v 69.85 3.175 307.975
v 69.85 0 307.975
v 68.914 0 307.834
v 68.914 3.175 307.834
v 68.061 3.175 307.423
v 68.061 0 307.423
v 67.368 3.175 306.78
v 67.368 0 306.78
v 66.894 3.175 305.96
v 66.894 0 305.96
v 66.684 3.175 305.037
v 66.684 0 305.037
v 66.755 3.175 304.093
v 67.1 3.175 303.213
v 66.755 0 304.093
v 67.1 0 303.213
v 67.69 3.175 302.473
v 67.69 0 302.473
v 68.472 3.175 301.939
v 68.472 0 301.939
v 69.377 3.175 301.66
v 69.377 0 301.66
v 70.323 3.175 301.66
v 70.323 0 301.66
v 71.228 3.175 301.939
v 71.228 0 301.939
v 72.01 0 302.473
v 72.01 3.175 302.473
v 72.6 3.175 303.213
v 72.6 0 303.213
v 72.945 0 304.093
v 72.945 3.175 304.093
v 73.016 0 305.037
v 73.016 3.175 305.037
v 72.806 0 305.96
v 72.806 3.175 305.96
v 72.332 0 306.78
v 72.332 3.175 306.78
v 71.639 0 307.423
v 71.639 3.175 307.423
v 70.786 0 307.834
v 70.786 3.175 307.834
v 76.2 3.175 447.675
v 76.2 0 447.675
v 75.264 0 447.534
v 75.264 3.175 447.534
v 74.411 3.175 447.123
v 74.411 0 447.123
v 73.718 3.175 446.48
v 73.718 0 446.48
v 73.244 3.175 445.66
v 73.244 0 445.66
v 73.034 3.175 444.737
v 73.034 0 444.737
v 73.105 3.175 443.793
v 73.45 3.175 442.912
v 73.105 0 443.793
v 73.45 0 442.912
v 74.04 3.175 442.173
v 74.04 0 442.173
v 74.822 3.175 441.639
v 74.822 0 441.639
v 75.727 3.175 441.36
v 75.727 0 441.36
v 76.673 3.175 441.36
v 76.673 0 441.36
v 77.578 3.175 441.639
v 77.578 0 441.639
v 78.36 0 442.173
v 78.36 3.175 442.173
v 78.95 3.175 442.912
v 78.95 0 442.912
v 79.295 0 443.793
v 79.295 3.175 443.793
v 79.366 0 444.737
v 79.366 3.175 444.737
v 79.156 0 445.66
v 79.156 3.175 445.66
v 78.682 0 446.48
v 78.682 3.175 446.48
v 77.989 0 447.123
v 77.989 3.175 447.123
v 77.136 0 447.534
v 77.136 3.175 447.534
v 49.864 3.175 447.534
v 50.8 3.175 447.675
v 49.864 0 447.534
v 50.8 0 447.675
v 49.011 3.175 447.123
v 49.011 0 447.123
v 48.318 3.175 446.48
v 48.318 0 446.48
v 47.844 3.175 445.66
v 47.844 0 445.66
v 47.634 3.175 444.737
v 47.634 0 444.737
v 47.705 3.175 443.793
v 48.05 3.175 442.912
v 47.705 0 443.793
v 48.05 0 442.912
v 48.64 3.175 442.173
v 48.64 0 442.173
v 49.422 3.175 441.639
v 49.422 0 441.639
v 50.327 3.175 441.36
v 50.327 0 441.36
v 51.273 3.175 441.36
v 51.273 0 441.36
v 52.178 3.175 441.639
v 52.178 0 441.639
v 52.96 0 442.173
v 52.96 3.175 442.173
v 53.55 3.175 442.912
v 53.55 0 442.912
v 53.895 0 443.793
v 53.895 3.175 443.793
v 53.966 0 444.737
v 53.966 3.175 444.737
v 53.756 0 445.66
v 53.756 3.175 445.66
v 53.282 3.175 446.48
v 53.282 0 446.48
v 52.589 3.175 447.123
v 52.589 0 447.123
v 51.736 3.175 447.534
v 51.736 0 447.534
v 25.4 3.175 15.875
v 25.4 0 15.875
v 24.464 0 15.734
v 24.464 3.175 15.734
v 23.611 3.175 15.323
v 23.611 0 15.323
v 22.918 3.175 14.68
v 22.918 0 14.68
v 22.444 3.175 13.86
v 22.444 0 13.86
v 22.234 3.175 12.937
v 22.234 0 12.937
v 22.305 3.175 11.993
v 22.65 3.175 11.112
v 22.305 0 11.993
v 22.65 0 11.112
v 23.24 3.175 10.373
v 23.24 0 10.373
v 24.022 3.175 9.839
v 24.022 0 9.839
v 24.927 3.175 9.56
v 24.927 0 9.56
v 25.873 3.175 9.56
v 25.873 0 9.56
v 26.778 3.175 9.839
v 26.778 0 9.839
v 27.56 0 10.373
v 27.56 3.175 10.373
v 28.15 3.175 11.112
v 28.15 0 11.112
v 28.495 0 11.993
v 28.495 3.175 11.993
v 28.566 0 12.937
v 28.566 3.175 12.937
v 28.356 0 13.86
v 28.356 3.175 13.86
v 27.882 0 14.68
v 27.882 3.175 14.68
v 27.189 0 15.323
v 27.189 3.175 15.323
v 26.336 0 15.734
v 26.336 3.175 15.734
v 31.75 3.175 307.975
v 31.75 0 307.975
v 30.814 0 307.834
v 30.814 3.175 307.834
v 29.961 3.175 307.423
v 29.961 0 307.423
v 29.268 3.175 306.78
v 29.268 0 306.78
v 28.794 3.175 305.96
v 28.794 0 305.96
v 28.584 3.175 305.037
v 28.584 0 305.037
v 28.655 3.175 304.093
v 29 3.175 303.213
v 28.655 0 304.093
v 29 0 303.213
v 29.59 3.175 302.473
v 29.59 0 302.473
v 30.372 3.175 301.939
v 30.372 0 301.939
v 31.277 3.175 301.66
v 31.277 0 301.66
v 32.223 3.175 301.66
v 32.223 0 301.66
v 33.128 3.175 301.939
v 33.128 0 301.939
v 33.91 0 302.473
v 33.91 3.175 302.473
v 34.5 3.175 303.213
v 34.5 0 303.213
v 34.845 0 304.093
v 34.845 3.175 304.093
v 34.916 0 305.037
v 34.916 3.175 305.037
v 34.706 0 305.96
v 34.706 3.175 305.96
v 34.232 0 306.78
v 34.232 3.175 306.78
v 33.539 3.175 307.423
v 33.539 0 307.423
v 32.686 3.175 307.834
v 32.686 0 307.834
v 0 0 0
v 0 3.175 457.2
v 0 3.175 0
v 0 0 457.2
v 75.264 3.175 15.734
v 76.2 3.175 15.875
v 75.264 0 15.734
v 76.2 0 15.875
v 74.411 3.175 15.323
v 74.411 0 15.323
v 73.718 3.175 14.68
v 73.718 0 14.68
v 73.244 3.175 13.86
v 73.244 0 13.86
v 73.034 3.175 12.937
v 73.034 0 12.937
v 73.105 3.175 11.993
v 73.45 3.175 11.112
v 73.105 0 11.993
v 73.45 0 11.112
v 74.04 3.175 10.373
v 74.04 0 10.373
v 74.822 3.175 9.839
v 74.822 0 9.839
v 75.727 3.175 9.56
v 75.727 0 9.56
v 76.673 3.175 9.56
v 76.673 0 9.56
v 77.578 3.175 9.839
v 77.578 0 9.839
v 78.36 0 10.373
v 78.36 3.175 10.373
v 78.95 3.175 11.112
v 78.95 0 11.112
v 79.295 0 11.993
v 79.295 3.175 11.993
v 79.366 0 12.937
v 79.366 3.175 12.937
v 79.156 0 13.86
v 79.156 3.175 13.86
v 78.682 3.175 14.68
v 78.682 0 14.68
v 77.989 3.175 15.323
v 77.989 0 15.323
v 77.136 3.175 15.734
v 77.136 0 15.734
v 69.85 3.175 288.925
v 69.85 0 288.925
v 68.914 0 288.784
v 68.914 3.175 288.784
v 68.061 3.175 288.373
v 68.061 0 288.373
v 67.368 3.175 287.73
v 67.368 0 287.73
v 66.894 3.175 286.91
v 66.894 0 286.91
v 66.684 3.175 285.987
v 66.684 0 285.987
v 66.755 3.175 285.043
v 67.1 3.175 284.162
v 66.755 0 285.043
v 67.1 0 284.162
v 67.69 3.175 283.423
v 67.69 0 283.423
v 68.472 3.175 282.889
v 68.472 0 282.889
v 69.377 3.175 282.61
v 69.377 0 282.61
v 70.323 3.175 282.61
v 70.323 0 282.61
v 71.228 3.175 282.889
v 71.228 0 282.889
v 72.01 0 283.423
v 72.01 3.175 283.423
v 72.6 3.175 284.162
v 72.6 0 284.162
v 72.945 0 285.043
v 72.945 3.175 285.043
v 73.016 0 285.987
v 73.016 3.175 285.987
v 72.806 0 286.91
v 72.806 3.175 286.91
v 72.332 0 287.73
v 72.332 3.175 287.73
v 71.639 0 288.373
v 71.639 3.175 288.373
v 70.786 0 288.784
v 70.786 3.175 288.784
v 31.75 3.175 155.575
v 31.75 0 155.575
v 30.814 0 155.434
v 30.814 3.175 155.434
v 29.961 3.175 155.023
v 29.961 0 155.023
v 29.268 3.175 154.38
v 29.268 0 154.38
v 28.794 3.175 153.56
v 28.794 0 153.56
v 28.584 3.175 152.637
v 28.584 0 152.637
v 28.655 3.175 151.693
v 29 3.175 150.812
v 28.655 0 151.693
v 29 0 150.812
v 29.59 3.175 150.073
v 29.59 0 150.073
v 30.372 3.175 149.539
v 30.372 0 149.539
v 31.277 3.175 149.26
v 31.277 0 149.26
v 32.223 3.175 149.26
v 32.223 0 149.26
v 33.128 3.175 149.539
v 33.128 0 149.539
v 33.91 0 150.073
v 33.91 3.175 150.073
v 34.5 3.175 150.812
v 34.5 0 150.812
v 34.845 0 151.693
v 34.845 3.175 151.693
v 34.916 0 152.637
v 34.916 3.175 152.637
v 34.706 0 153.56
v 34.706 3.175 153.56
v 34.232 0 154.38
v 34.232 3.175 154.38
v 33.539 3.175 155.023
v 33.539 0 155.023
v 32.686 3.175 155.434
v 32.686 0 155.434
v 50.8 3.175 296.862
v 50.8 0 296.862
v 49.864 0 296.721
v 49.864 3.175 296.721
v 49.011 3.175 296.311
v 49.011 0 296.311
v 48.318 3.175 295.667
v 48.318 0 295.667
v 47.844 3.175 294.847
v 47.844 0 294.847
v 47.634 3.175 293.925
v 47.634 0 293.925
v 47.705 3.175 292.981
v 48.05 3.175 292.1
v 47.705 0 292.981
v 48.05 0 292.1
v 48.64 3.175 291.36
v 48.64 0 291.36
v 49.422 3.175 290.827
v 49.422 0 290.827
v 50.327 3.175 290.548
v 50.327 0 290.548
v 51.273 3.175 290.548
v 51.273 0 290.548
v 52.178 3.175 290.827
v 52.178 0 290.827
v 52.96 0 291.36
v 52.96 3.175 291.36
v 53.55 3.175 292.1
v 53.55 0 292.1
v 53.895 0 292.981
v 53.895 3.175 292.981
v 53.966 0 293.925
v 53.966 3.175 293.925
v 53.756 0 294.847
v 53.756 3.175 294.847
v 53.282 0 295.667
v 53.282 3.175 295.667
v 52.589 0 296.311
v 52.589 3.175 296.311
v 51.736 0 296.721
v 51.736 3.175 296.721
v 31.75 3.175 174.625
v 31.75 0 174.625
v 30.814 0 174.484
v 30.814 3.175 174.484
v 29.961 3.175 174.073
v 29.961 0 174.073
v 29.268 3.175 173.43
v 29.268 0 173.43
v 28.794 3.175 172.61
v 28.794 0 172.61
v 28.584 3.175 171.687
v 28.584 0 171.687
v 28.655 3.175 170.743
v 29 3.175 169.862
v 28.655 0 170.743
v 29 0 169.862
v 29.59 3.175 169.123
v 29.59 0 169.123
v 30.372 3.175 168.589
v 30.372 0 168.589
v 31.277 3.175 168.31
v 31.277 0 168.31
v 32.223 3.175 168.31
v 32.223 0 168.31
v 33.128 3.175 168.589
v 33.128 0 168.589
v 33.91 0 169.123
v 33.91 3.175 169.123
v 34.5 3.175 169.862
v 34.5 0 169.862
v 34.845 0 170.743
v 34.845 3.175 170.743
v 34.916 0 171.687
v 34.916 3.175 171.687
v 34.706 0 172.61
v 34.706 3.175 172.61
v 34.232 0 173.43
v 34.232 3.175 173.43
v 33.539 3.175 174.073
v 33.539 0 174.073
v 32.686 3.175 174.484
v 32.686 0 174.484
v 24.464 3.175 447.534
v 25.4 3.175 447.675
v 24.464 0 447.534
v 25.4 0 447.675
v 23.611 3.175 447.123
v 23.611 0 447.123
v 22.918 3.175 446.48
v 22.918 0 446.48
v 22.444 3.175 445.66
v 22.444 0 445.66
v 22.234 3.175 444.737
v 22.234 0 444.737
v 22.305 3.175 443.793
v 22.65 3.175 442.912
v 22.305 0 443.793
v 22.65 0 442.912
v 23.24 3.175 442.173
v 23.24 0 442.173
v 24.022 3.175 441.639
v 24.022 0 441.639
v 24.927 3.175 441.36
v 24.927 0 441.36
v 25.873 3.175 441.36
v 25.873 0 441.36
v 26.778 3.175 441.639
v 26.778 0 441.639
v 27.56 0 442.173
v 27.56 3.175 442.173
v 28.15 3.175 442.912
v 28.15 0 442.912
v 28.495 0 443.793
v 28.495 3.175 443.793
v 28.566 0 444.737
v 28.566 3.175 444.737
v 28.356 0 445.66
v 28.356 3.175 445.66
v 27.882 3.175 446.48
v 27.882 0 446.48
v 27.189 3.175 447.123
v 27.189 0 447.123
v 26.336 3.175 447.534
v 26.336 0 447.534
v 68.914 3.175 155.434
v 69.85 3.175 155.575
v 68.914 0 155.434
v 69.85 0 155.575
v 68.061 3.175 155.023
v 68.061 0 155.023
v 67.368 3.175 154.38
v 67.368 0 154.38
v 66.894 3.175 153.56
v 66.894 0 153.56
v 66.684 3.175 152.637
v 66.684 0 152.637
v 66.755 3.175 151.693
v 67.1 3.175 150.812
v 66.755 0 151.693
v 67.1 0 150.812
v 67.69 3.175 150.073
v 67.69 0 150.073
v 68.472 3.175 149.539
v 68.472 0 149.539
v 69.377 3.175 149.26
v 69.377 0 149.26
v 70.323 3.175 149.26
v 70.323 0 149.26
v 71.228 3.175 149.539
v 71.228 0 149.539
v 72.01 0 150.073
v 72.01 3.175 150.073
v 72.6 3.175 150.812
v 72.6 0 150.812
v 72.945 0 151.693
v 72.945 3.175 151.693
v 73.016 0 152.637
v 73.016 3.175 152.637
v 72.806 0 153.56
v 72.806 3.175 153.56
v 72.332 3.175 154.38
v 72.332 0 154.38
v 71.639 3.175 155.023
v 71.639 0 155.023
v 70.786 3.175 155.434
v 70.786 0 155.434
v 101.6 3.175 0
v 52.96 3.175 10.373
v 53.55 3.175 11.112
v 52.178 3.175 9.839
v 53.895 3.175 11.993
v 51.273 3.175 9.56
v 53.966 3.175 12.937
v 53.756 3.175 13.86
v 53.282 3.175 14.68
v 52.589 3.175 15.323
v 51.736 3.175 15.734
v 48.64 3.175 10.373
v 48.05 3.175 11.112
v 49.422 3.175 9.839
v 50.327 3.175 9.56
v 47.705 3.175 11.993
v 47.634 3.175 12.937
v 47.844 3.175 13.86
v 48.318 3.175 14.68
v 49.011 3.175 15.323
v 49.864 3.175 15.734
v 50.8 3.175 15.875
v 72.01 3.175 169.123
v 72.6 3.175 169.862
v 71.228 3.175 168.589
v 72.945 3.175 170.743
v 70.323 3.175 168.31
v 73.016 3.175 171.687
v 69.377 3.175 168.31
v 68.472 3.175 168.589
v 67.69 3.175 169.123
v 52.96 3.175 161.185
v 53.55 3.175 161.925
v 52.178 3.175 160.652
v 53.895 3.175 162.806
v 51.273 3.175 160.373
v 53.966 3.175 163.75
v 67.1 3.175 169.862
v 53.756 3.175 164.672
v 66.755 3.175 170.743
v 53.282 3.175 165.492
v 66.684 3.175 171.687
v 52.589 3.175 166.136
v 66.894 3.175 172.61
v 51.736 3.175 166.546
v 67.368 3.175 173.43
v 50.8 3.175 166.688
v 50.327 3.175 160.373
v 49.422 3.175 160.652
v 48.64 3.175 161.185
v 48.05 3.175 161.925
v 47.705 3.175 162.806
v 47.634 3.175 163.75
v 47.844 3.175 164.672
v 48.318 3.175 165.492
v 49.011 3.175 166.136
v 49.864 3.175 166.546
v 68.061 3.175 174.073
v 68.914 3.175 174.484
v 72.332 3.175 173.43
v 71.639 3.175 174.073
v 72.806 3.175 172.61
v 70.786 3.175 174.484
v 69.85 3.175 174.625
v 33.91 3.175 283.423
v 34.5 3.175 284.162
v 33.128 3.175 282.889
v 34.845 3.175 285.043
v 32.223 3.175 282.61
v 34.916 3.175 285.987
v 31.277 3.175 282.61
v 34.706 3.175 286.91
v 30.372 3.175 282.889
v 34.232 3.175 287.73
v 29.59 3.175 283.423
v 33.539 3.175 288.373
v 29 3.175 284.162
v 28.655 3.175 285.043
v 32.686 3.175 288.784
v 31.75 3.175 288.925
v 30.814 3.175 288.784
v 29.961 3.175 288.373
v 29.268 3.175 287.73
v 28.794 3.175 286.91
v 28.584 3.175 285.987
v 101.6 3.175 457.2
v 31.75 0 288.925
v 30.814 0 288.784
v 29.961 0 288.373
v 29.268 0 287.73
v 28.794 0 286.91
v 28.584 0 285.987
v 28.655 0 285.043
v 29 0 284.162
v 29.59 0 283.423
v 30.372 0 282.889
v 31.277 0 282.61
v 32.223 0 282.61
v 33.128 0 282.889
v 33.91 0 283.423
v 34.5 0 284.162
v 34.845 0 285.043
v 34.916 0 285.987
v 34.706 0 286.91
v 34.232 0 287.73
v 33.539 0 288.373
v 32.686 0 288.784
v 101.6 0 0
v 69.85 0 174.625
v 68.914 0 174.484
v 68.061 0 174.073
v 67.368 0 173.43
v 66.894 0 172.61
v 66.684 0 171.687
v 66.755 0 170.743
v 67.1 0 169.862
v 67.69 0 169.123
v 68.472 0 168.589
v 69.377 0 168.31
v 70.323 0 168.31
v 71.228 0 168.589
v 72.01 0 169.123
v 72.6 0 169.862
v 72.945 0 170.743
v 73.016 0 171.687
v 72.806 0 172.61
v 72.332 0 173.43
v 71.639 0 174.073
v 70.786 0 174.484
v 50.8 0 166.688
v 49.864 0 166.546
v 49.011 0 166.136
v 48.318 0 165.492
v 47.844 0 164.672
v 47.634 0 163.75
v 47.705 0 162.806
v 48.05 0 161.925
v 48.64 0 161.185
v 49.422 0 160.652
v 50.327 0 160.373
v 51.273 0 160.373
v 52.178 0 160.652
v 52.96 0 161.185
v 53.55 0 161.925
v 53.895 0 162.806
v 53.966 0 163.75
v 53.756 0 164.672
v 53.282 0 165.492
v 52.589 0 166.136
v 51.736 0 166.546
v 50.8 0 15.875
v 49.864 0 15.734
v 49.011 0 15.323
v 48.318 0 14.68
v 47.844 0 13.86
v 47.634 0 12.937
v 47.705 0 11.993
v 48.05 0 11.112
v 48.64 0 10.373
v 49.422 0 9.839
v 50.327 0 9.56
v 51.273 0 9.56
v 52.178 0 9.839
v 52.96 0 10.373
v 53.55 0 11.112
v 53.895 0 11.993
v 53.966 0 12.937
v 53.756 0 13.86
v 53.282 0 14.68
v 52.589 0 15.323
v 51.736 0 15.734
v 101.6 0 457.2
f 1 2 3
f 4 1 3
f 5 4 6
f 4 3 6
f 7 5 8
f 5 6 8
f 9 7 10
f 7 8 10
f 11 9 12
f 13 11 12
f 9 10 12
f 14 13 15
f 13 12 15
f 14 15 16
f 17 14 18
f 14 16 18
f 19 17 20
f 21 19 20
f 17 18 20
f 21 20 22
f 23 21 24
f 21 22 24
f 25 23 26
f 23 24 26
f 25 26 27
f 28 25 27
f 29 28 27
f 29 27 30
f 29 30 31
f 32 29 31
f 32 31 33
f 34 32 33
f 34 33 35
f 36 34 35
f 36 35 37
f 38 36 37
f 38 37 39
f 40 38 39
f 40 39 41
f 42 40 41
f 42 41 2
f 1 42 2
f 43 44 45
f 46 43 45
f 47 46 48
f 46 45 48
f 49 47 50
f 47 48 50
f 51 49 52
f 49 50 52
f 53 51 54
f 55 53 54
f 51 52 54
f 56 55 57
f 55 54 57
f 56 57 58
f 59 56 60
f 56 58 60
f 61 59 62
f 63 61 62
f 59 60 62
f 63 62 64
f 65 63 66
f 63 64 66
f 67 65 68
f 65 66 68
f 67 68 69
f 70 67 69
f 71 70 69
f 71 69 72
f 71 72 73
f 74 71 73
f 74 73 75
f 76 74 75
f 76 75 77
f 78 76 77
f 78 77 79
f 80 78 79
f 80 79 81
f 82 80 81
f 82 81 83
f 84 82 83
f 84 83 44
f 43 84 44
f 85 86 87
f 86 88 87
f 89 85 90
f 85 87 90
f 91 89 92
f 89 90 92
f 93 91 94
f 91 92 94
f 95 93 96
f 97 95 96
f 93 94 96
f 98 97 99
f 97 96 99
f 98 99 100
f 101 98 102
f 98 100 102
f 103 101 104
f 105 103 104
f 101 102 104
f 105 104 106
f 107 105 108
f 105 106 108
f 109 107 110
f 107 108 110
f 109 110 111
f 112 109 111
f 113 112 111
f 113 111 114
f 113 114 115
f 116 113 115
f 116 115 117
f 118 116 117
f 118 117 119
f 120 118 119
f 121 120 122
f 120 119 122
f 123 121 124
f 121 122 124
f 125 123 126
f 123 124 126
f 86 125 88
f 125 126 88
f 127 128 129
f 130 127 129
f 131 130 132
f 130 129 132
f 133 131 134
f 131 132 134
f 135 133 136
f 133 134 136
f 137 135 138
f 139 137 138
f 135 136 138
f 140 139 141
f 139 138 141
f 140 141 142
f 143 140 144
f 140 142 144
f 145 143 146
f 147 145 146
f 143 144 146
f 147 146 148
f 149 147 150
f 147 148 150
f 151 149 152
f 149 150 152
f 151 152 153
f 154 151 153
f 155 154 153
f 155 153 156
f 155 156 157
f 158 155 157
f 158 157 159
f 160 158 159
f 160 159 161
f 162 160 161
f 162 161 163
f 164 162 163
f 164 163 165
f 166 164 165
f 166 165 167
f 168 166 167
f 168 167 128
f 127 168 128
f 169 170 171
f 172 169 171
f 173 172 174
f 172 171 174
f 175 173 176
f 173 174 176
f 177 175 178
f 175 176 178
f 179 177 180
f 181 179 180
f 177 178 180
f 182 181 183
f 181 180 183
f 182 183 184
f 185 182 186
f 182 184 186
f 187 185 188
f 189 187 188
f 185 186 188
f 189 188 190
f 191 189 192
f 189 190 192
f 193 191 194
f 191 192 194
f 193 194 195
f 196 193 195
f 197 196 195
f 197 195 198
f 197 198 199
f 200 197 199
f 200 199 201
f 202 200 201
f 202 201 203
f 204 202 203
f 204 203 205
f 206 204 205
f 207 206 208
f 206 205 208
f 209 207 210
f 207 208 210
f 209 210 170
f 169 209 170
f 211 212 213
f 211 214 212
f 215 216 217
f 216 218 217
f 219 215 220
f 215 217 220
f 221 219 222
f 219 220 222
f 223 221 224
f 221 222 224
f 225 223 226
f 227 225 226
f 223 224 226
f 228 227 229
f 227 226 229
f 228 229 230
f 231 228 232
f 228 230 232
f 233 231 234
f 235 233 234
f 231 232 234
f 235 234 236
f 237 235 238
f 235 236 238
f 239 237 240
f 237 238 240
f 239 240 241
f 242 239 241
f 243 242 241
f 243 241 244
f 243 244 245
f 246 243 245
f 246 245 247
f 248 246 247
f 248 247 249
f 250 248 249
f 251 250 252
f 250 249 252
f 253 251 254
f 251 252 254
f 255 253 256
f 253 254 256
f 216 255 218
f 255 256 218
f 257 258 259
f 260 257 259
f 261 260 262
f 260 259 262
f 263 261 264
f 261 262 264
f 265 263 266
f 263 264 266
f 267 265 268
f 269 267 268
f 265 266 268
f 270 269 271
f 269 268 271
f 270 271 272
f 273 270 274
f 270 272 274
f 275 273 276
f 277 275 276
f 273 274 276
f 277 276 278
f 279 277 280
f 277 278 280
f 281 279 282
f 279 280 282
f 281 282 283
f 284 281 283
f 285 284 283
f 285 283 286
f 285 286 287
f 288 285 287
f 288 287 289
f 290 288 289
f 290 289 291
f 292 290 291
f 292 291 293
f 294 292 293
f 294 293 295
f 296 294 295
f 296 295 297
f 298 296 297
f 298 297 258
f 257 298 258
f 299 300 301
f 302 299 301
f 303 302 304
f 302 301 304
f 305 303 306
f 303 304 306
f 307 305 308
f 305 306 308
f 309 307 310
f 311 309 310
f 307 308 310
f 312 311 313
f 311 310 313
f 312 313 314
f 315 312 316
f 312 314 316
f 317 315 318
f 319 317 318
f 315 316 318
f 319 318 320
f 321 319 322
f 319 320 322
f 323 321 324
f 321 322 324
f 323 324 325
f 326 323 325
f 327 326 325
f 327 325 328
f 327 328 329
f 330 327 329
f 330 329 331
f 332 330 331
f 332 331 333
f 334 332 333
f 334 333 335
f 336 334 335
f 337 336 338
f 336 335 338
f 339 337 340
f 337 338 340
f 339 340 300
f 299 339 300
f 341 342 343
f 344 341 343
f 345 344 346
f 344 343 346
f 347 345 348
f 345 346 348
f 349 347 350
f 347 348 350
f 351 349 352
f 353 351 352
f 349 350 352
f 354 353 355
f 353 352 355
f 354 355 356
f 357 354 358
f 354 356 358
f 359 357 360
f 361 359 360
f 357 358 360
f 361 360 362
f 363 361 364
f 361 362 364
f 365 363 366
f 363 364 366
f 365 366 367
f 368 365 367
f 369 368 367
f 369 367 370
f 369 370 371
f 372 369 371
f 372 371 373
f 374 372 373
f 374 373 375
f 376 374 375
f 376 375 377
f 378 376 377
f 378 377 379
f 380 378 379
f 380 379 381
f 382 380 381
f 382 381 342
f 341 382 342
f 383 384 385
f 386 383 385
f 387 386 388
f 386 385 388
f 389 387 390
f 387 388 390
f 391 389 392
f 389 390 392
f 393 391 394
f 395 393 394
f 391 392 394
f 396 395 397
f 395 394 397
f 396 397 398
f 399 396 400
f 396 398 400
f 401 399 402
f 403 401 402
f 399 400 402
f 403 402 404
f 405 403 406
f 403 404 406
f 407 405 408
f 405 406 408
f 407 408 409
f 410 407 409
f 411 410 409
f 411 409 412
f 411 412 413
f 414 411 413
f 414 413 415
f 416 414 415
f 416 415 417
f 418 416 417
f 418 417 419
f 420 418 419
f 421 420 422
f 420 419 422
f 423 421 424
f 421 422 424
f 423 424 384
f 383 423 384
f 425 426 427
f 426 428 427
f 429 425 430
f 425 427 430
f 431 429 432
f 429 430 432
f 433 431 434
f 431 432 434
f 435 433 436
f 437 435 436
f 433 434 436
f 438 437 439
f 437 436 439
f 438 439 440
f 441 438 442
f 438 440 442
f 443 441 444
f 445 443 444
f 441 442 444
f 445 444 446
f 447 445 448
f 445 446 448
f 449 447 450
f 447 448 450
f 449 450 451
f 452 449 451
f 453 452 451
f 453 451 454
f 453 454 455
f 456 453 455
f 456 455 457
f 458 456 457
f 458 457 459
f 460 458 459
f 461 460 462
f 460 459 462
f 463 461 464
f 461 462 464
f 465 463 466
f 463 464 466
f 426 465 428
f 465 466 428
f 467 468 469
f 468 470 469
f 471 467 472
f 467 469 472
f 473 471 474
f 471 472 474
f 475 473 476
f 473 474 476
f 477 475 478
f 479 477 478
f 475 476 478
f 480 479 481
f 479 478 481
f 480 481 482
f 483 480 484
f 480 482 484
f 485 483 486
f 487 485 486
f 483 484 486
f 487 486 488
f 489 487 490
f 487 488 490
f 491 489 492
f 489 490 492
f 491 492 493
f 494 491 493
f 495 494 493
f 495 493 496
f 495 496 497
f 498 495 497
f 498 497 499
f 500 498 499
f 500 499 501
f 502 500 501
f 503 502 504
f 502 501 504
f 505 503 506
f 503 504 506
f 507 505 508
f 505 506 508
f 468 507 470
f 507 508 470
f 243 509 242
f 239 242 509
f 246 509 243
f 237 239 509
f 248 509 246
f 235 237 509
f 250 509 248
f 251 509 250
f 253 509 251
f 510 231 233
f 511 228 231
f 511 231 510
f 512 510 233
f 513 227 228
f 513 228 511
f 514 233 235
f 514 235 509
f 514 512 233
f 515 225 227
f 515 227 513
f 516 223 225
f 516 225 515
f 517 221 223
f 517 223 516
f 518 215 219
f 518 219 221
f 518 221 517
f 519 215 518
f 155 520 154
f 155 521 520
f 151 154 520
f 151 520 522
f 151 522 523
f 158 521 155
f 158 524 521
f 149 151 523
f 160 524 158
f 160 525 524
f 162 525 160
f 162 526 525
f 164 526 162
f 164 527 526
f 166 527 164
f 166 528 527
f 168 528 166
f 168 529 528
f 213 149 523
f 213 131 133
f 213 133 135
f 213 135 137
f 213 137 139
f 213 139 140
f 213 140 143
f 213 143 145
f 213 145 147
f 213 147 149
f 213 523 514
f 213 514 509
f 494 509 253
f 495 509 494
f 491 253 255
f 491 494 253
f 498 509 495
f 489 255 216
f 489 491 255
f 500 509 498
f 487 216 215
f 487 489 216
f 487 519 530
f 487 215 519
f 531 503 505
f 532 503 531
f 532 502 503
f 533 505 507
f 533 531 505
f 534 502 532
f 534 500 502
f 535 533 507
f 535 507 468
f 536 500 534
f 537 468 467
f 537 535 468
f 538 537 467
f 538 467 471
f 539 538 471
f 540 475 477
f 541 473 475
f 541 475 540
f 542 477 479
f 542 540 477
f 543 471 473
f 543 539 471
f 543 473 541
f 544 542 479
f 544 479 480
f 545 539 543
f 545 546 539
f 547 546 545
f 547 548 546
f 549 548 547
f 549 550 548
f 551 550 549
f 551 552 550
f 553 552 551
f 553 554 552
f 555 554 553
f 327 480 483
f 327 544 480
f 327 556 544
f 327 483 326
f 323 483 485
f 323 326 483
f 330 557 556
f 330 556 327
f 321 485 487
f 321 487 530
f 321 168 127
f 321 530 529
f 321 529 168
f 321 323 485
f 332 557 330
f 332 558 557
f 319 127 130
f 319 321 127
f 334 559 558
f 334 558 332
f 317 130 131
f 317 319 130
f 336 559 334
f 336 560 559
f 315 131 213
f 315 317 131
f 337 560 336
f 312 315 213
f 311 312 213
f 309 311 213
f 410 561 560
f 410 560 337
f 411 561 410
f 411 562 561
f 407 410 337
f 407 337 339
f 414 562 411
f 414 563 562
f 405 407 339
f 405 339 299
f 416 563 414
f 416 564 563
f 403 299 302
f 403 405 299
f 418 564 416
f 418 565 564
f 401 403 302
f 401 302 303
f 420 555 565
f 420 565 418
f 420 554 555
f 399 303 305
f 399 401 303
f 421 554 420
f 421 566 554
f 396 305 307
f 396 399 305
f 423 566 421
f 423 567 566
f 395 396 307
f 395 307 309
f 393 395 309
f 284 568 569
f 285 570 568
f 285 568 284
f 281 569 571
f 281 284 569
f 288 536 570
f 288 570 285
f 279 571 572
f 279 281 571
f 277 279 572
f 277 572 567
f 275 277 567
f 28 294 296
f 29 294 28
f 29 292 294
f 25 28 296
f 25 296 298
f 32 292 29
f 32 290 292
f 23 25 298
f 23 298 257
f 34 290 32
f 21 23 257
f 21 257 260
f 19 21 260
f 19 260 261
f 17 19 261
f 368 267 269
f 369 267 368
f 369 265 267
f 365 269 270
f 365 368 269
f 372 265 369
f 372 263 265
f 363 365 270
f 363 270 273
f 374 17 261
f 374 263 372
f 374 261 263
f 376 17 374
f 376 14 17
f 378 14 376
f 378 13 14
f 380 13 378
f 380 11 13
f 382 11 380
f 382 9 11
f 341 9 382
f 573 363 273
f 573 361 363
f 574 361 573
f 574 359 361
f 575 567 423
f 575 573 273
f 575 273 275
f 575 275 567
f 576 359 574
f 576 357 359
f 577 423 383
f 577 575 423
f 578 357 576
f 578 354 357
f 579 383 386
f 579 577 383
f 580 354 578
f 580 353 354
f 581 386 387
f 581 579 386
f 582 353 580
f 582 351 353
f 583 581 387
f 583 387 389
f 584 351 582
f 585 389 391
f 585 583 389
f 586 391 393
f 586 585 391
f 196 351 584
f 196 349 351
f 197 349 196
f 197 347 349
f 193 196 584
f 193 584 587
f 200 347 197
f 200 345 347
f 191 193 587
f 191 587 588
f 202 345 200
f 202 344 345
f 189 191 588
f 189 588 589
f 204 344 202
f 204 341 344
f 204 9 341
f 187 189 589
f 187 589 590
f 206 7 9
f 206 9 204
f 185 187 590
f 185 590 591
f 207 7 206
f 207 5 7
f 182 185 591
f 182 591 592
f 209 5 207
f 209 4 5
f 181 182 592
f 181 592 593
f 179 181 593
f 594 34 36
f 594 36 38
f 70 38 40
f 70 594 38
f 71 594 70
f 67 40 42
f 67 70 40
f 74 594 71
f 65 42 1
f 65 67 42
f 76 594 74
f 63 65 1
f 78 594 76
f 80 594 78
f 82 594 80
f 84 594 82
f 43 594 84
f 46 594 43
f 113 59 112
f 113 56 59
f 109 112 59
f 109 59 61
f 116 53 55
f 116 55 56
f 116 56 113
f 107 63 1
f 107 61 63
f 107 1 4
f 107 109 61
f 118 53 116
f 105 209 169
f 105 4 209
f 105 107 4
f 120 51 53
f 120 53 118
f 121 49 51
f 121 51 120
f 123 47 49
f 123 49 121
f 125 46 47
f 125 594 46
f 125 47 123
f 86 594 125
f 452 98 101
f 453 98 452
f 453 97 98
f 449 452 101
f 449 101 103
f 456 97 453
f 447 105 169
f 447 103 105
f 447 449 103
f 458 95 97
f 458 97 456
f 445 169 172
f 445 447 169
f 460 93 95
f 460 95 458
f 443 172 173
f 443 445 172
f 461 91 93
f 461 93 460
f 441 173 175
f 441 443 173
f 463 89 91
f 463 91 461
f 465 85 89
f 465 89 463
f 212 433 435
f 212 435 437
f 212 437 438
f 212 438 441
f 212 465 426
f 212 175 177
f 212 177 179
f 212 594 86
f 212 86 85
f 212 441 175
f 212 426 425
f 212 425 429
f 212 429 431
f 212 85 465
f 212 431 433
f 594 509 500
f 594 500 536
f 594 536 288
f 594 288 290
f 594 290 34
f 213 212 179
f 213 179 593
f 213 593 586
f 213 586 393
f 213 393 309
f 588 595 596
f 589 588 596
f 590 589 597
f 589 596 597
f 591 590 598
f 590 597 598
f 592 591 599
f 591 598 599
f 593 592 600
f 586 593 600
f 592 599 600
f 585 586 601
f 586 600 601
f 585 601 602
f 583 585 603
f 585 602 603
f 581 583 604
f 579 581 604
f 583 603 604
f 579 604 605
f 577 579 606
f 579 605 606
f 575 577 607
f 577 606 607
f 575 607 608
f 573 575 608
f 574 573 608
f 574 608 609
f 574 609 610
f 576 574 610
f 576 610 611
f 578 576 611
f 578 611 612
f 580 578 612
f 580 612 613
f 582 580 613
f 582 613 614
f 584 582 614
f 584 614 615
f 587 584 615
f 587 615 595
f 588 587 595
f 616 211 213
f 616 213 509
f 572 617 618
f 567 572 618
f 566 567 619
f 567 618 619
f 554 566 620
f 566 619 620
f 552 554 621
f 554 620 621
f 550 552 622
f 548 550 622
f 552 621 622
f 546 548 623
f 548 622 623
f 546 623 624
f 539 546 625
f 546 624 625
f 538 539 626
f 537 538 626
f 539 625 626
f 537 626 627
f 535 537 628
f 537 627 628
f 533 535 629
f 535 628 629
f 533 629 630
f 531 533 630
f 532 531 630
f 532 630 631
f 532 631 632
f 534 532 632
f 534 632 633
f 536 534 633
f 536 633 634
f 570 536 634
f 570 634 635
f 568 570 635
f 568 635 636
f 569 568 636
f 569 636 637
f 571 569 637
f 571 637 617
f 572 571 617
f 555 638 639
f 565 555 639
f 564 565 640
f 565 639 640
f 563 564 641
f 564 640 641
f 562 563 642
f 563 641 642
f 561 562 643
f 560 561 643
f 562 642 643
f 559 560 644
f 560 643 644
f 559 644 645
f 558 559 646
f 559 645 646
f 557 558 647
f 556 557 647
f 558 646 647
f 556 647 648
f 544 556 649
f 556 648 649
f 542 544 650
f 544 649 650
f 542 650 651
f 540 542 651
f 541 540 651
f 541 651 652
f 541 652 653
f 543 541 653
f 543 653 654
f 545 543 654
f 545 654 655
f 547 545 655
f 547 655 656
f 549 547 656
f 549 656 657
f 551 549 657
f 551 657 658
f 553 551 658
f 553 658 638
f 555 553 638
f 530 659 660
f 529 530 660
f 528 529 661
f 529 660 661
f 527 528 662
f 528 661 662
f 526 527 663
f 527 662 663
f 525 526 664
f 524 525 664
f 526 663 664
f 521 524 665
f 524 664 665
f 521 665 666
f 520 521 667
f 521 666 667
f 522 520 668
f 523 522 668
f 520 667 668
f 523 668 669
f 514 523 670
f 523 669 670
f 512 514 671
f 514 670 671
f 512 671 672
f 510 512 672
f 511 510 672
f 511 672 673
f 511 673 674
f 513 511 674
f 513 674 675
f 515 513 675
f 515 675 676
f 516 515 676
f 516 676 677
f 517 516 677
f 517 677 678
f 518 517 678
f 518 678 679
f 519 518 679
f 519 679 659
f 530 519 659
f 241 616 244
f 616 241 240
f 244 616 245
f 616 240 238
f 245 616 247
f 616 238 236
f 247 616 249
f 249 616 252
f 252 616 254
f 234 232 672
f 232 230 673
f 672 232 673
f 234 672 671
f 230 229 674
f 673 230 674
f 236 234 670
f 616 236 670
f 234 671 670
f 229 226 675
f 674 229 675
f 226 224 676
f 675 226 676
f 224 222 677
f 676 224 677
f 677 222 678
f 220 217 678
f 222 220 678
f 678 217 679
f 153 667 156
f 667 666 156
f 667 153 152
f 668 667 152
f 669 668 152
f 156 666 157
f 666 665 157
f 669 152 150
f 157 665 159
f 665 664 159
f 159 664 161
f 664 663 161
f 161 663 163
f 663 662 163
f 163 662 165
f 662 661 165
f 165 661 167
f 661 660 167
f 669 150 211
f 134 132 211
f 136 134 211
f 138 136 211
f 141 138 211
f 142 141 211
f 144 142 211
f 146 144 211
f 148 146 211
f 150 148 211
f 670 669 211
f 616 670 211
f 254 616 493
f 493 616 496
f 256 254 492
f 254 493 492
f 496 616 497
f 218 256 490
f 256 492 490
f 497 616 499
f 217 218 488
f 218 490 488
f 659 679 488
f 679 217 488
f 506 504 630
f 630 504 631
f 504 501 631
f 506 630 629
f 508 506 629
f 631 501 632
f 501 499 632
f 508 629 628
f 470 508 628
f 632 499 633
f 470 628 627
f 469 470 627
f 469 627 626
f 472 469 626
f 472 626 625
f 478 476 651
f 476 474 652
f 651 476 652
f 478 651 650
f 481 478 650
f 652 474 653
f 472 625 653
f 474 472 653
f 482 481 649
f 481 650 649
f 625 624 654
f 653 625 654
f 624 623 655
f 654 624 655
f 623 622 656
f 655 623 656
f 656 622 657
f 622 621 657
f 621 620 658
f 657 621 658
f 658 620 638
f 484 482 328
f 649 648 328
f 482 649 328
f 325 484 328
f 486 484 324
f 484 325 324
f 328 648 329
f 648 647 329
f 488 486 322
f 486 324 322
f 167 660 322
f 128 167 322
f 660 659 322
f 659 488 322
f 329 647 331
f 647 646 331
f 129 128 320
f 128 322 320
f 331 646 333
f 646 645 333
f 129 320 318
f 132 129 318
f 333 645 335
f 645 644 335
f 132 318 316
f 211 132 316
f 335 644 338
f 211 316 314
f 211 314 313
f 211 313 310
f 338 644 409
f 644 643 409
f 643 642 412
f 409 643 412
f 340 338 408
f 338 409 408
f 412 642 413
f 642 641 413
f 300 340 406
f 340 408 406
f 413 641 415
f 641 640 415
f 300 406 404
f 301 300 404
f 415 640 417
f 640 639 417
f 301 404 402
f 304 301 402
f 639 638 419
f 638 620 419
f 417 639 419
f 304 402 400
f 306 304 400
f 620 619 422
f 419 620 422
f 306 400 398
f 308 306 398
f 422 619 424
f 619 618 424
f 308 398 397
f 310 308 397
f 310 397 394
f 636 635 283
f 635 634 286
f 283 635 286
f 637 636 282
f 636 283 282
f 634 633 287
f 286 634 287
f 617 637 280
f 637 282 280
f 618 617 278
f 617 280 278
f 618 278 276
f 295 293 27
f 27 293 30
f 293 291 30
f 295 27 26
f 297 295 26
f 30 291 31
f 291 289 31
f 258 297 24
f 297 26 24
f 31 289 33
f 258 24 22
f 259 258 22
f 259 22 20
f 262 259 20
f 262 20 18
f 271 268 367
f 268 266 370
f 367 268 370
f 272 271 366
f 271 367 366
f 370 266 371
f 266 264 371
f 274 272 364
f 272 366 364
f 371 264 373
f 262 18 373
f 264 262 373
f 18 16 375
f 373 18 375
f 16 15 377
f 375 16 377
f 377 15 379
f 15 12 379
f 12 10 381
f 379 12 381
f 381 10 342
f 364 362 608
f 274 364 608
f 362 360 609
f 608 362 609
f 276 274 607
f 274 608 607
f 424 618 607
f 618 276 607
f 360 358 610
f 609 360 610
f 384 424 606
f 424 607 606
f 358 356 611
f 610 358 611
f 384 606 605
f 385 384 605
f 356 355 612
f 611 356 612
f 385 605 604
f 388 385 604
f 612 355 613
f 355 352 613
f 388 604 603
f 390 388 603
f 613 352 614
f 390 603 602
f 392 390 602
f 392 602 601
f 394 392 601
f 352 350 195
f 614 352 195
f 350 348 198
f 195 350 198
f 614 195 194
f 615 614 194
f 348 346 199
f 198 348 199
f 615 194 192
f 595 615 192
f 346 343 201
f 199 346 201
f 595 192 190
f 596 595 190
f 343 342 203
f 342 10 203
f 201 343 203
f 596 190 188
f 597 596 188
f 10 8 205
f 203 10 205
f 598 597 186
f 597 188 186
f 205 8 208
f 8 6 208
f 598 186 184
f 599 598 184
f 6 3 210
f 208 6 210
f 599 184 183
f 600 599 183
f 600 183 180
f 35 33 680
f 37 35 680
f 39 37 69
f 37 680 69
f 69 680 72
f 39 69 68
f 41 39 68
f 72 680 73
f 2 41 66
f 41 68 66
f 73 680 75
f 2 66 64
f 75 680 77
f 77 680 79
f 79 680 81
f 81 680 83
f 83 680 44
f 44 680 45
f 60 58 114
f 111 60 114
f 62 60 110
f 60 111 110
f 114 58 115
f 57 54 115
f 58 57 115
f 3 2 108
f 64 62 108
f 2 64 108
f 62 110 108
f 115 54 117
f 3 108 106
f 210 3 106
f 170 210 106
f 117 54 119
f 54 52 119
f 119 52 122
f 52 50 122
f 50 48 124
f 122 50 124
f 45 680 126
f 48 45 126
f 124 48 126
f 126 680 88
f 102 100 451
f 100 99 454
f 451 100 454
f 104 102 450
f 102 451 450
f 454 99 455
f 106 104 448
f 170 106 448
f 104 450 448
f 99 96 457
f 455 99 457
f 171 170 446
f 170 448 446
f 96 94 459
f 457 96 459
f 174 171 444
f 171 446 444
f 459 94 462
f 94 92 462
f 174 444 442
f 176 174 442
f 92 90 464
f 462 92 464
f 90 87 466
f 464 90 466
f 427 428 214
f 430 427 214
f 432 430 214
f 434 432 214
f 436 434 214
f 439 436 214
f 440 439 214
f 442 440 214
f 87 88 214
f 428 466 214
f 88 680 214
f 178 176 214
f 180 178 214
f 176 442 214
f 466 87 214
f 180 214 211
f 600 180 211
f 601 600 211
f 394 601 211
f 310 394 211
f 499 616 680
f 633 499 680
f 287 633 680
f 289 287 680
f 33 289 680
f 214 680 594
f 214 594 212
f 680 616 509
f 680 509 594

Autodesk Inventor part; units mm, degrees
ref_plane "YZ Plane" through (0, 0, 0) normal (1, 0, 0) x (0, 1, 0)
ref_plane "XZ Plane" through (0, 0, 0) normal (0, 1, 0) x (-1, 0, 0)
ref_plane "XY Plane" through (0, 0, 0) normal (0, 0, 1) x (1, 0, 0)
sketch "Sketch1" plane through (0, 0, 0) normal (0, 1, 0) x (-1, 0, 0)
  line L0 (0, 0) -> (-101.6, 0)
  line L1 (-101.6, 0) -> (-101.6, 457.2)
  line L2 (-101.6, 457.2) -> (0, 457.2)
  line L3 (0, 457.2) -> (0, 0)
  point P0 (-50.8, 228.6)
  dimension "d0" = 101.6
  dimension "d1" = 457.2
  dimension "d25" = 50.8
  dimension "d26" = 228.6
extrude "Extrusion1" add sketch "Sketch1" along normal blind 3.175
sketch "Sketch2" plane through (0, 3.175, 0) normal (0, 1, 0) x (1, 0, 0)
  line L0 (101.6, -457.2) -> (101.6, 0) projected
  line L1 (101.6, -457.2) -> (0, -457.2) projected
  line L2 (101.6, 0) -> (0, 0) projected
  point P0 (25.4, -12.7)
  point P1 (50.8, -12.7)
  point P2 (76.2, -12.7)
  point P3 (25.4, -444.5)
  point P4 (76.2, -444.5)
  point P5 (50.8, -444.5)
  dimension "d60" = 25.4
  dimension "d61" = 25.4
  dimension "d62" = 25.4
  dimension "d63" = 76.2
  dimension "d64" = 25.4
  dimension "d65" = 50.8
  dimension "d66" = 12.7
  dimension "d67" = 12.7
  dimension "d68" = 12.7
  dimension "d69" = 12.7
  dimension "d70" = 12.7
  dimension "d71" = 12.7
hole "Hole6" at (25.4, 3.175, 12.7) at (50.8, 3.175, 12.7) at (76.2, 3.175, 12.7) at (25.4, 3.175, 444.5) at (76.2, 3.175, 444.5) at (50.8, 3.175, 444.5) direction (0, -1, 0) diameter 6.35 end through all
sketch "Sketch3" plane through (0, 3.175, 0) normal (0, 1, 0) x (1, 0, 0)
  line L0 (0, 0) -> (0, -457.2) projected
  line L1 (101.6, -457.2) -> (101.6, 0) projected
  line L2 (101.6, 0) -> (0, 0) projected
  line L3 (0, -228.6) -> (101.6, -228.6)
  line L4 (101.6, 0) -> (101.6, -457.2) projected
  point P0 (69.85, -152.4)
  point P1 (31.75, -152.4)
  point P2 (31.75, -171.45)
  point P3 (69.85, -171.45)
  point P4 (69.85, -152.4)
  point P5 (31.75, -304.8)
  point P6 (31.75, -285.75)
  point P7 (69.85, -285.75)
  point P8 (69.85, -304.8)
  dimension "d79" = 38.1
  dimension "d80" = 19.05
  dimension "d81" = 31.75
  dimension "d82" = 31.75
  dimension "d83" = 152.4
  dimension "d84" = 19.05
  dimension "d85" = 38.1
  dimension "d86" = 152.4
hole "Hole7" at (69.85, 3.175, 152.4) at (31.75, 3.175, 152.4) at (31.75, 3.175, 171.45) at (69.85, 3.175, 171.45) at (31.75, 3.175, 285.75) at (31.75, 3.175, 304.8) at (69.85, 3.175, 304.8) at (69.85, 3.175, 285.75) direction (0, -1, 0) diameter 6.35 end through all
sketch "Sketch4" plane through (0, 3.175, 0) normal (0, 1, 0) x (1, 0, 0)
  line L0 (0, 0) -> (0, -457.2) projected
  line L1 (101.6, 0) -> (0, 0) projected
  point P0 (50.8, -163.5125)
  point P1 (50.8, -293.6875)
  dimension "d94" = 130.175
  dimension "d95" = 50.8
  dimension "d96" = 50.8
  dimension "d97" = 163.5125
hole "Hole8" at (50.8, 3.175, 163.5125) at (50.8, 3.175, 293.6875) direction (0, -1, 0) diameter 6.35 end through all
properties part number "Claw Plate"
